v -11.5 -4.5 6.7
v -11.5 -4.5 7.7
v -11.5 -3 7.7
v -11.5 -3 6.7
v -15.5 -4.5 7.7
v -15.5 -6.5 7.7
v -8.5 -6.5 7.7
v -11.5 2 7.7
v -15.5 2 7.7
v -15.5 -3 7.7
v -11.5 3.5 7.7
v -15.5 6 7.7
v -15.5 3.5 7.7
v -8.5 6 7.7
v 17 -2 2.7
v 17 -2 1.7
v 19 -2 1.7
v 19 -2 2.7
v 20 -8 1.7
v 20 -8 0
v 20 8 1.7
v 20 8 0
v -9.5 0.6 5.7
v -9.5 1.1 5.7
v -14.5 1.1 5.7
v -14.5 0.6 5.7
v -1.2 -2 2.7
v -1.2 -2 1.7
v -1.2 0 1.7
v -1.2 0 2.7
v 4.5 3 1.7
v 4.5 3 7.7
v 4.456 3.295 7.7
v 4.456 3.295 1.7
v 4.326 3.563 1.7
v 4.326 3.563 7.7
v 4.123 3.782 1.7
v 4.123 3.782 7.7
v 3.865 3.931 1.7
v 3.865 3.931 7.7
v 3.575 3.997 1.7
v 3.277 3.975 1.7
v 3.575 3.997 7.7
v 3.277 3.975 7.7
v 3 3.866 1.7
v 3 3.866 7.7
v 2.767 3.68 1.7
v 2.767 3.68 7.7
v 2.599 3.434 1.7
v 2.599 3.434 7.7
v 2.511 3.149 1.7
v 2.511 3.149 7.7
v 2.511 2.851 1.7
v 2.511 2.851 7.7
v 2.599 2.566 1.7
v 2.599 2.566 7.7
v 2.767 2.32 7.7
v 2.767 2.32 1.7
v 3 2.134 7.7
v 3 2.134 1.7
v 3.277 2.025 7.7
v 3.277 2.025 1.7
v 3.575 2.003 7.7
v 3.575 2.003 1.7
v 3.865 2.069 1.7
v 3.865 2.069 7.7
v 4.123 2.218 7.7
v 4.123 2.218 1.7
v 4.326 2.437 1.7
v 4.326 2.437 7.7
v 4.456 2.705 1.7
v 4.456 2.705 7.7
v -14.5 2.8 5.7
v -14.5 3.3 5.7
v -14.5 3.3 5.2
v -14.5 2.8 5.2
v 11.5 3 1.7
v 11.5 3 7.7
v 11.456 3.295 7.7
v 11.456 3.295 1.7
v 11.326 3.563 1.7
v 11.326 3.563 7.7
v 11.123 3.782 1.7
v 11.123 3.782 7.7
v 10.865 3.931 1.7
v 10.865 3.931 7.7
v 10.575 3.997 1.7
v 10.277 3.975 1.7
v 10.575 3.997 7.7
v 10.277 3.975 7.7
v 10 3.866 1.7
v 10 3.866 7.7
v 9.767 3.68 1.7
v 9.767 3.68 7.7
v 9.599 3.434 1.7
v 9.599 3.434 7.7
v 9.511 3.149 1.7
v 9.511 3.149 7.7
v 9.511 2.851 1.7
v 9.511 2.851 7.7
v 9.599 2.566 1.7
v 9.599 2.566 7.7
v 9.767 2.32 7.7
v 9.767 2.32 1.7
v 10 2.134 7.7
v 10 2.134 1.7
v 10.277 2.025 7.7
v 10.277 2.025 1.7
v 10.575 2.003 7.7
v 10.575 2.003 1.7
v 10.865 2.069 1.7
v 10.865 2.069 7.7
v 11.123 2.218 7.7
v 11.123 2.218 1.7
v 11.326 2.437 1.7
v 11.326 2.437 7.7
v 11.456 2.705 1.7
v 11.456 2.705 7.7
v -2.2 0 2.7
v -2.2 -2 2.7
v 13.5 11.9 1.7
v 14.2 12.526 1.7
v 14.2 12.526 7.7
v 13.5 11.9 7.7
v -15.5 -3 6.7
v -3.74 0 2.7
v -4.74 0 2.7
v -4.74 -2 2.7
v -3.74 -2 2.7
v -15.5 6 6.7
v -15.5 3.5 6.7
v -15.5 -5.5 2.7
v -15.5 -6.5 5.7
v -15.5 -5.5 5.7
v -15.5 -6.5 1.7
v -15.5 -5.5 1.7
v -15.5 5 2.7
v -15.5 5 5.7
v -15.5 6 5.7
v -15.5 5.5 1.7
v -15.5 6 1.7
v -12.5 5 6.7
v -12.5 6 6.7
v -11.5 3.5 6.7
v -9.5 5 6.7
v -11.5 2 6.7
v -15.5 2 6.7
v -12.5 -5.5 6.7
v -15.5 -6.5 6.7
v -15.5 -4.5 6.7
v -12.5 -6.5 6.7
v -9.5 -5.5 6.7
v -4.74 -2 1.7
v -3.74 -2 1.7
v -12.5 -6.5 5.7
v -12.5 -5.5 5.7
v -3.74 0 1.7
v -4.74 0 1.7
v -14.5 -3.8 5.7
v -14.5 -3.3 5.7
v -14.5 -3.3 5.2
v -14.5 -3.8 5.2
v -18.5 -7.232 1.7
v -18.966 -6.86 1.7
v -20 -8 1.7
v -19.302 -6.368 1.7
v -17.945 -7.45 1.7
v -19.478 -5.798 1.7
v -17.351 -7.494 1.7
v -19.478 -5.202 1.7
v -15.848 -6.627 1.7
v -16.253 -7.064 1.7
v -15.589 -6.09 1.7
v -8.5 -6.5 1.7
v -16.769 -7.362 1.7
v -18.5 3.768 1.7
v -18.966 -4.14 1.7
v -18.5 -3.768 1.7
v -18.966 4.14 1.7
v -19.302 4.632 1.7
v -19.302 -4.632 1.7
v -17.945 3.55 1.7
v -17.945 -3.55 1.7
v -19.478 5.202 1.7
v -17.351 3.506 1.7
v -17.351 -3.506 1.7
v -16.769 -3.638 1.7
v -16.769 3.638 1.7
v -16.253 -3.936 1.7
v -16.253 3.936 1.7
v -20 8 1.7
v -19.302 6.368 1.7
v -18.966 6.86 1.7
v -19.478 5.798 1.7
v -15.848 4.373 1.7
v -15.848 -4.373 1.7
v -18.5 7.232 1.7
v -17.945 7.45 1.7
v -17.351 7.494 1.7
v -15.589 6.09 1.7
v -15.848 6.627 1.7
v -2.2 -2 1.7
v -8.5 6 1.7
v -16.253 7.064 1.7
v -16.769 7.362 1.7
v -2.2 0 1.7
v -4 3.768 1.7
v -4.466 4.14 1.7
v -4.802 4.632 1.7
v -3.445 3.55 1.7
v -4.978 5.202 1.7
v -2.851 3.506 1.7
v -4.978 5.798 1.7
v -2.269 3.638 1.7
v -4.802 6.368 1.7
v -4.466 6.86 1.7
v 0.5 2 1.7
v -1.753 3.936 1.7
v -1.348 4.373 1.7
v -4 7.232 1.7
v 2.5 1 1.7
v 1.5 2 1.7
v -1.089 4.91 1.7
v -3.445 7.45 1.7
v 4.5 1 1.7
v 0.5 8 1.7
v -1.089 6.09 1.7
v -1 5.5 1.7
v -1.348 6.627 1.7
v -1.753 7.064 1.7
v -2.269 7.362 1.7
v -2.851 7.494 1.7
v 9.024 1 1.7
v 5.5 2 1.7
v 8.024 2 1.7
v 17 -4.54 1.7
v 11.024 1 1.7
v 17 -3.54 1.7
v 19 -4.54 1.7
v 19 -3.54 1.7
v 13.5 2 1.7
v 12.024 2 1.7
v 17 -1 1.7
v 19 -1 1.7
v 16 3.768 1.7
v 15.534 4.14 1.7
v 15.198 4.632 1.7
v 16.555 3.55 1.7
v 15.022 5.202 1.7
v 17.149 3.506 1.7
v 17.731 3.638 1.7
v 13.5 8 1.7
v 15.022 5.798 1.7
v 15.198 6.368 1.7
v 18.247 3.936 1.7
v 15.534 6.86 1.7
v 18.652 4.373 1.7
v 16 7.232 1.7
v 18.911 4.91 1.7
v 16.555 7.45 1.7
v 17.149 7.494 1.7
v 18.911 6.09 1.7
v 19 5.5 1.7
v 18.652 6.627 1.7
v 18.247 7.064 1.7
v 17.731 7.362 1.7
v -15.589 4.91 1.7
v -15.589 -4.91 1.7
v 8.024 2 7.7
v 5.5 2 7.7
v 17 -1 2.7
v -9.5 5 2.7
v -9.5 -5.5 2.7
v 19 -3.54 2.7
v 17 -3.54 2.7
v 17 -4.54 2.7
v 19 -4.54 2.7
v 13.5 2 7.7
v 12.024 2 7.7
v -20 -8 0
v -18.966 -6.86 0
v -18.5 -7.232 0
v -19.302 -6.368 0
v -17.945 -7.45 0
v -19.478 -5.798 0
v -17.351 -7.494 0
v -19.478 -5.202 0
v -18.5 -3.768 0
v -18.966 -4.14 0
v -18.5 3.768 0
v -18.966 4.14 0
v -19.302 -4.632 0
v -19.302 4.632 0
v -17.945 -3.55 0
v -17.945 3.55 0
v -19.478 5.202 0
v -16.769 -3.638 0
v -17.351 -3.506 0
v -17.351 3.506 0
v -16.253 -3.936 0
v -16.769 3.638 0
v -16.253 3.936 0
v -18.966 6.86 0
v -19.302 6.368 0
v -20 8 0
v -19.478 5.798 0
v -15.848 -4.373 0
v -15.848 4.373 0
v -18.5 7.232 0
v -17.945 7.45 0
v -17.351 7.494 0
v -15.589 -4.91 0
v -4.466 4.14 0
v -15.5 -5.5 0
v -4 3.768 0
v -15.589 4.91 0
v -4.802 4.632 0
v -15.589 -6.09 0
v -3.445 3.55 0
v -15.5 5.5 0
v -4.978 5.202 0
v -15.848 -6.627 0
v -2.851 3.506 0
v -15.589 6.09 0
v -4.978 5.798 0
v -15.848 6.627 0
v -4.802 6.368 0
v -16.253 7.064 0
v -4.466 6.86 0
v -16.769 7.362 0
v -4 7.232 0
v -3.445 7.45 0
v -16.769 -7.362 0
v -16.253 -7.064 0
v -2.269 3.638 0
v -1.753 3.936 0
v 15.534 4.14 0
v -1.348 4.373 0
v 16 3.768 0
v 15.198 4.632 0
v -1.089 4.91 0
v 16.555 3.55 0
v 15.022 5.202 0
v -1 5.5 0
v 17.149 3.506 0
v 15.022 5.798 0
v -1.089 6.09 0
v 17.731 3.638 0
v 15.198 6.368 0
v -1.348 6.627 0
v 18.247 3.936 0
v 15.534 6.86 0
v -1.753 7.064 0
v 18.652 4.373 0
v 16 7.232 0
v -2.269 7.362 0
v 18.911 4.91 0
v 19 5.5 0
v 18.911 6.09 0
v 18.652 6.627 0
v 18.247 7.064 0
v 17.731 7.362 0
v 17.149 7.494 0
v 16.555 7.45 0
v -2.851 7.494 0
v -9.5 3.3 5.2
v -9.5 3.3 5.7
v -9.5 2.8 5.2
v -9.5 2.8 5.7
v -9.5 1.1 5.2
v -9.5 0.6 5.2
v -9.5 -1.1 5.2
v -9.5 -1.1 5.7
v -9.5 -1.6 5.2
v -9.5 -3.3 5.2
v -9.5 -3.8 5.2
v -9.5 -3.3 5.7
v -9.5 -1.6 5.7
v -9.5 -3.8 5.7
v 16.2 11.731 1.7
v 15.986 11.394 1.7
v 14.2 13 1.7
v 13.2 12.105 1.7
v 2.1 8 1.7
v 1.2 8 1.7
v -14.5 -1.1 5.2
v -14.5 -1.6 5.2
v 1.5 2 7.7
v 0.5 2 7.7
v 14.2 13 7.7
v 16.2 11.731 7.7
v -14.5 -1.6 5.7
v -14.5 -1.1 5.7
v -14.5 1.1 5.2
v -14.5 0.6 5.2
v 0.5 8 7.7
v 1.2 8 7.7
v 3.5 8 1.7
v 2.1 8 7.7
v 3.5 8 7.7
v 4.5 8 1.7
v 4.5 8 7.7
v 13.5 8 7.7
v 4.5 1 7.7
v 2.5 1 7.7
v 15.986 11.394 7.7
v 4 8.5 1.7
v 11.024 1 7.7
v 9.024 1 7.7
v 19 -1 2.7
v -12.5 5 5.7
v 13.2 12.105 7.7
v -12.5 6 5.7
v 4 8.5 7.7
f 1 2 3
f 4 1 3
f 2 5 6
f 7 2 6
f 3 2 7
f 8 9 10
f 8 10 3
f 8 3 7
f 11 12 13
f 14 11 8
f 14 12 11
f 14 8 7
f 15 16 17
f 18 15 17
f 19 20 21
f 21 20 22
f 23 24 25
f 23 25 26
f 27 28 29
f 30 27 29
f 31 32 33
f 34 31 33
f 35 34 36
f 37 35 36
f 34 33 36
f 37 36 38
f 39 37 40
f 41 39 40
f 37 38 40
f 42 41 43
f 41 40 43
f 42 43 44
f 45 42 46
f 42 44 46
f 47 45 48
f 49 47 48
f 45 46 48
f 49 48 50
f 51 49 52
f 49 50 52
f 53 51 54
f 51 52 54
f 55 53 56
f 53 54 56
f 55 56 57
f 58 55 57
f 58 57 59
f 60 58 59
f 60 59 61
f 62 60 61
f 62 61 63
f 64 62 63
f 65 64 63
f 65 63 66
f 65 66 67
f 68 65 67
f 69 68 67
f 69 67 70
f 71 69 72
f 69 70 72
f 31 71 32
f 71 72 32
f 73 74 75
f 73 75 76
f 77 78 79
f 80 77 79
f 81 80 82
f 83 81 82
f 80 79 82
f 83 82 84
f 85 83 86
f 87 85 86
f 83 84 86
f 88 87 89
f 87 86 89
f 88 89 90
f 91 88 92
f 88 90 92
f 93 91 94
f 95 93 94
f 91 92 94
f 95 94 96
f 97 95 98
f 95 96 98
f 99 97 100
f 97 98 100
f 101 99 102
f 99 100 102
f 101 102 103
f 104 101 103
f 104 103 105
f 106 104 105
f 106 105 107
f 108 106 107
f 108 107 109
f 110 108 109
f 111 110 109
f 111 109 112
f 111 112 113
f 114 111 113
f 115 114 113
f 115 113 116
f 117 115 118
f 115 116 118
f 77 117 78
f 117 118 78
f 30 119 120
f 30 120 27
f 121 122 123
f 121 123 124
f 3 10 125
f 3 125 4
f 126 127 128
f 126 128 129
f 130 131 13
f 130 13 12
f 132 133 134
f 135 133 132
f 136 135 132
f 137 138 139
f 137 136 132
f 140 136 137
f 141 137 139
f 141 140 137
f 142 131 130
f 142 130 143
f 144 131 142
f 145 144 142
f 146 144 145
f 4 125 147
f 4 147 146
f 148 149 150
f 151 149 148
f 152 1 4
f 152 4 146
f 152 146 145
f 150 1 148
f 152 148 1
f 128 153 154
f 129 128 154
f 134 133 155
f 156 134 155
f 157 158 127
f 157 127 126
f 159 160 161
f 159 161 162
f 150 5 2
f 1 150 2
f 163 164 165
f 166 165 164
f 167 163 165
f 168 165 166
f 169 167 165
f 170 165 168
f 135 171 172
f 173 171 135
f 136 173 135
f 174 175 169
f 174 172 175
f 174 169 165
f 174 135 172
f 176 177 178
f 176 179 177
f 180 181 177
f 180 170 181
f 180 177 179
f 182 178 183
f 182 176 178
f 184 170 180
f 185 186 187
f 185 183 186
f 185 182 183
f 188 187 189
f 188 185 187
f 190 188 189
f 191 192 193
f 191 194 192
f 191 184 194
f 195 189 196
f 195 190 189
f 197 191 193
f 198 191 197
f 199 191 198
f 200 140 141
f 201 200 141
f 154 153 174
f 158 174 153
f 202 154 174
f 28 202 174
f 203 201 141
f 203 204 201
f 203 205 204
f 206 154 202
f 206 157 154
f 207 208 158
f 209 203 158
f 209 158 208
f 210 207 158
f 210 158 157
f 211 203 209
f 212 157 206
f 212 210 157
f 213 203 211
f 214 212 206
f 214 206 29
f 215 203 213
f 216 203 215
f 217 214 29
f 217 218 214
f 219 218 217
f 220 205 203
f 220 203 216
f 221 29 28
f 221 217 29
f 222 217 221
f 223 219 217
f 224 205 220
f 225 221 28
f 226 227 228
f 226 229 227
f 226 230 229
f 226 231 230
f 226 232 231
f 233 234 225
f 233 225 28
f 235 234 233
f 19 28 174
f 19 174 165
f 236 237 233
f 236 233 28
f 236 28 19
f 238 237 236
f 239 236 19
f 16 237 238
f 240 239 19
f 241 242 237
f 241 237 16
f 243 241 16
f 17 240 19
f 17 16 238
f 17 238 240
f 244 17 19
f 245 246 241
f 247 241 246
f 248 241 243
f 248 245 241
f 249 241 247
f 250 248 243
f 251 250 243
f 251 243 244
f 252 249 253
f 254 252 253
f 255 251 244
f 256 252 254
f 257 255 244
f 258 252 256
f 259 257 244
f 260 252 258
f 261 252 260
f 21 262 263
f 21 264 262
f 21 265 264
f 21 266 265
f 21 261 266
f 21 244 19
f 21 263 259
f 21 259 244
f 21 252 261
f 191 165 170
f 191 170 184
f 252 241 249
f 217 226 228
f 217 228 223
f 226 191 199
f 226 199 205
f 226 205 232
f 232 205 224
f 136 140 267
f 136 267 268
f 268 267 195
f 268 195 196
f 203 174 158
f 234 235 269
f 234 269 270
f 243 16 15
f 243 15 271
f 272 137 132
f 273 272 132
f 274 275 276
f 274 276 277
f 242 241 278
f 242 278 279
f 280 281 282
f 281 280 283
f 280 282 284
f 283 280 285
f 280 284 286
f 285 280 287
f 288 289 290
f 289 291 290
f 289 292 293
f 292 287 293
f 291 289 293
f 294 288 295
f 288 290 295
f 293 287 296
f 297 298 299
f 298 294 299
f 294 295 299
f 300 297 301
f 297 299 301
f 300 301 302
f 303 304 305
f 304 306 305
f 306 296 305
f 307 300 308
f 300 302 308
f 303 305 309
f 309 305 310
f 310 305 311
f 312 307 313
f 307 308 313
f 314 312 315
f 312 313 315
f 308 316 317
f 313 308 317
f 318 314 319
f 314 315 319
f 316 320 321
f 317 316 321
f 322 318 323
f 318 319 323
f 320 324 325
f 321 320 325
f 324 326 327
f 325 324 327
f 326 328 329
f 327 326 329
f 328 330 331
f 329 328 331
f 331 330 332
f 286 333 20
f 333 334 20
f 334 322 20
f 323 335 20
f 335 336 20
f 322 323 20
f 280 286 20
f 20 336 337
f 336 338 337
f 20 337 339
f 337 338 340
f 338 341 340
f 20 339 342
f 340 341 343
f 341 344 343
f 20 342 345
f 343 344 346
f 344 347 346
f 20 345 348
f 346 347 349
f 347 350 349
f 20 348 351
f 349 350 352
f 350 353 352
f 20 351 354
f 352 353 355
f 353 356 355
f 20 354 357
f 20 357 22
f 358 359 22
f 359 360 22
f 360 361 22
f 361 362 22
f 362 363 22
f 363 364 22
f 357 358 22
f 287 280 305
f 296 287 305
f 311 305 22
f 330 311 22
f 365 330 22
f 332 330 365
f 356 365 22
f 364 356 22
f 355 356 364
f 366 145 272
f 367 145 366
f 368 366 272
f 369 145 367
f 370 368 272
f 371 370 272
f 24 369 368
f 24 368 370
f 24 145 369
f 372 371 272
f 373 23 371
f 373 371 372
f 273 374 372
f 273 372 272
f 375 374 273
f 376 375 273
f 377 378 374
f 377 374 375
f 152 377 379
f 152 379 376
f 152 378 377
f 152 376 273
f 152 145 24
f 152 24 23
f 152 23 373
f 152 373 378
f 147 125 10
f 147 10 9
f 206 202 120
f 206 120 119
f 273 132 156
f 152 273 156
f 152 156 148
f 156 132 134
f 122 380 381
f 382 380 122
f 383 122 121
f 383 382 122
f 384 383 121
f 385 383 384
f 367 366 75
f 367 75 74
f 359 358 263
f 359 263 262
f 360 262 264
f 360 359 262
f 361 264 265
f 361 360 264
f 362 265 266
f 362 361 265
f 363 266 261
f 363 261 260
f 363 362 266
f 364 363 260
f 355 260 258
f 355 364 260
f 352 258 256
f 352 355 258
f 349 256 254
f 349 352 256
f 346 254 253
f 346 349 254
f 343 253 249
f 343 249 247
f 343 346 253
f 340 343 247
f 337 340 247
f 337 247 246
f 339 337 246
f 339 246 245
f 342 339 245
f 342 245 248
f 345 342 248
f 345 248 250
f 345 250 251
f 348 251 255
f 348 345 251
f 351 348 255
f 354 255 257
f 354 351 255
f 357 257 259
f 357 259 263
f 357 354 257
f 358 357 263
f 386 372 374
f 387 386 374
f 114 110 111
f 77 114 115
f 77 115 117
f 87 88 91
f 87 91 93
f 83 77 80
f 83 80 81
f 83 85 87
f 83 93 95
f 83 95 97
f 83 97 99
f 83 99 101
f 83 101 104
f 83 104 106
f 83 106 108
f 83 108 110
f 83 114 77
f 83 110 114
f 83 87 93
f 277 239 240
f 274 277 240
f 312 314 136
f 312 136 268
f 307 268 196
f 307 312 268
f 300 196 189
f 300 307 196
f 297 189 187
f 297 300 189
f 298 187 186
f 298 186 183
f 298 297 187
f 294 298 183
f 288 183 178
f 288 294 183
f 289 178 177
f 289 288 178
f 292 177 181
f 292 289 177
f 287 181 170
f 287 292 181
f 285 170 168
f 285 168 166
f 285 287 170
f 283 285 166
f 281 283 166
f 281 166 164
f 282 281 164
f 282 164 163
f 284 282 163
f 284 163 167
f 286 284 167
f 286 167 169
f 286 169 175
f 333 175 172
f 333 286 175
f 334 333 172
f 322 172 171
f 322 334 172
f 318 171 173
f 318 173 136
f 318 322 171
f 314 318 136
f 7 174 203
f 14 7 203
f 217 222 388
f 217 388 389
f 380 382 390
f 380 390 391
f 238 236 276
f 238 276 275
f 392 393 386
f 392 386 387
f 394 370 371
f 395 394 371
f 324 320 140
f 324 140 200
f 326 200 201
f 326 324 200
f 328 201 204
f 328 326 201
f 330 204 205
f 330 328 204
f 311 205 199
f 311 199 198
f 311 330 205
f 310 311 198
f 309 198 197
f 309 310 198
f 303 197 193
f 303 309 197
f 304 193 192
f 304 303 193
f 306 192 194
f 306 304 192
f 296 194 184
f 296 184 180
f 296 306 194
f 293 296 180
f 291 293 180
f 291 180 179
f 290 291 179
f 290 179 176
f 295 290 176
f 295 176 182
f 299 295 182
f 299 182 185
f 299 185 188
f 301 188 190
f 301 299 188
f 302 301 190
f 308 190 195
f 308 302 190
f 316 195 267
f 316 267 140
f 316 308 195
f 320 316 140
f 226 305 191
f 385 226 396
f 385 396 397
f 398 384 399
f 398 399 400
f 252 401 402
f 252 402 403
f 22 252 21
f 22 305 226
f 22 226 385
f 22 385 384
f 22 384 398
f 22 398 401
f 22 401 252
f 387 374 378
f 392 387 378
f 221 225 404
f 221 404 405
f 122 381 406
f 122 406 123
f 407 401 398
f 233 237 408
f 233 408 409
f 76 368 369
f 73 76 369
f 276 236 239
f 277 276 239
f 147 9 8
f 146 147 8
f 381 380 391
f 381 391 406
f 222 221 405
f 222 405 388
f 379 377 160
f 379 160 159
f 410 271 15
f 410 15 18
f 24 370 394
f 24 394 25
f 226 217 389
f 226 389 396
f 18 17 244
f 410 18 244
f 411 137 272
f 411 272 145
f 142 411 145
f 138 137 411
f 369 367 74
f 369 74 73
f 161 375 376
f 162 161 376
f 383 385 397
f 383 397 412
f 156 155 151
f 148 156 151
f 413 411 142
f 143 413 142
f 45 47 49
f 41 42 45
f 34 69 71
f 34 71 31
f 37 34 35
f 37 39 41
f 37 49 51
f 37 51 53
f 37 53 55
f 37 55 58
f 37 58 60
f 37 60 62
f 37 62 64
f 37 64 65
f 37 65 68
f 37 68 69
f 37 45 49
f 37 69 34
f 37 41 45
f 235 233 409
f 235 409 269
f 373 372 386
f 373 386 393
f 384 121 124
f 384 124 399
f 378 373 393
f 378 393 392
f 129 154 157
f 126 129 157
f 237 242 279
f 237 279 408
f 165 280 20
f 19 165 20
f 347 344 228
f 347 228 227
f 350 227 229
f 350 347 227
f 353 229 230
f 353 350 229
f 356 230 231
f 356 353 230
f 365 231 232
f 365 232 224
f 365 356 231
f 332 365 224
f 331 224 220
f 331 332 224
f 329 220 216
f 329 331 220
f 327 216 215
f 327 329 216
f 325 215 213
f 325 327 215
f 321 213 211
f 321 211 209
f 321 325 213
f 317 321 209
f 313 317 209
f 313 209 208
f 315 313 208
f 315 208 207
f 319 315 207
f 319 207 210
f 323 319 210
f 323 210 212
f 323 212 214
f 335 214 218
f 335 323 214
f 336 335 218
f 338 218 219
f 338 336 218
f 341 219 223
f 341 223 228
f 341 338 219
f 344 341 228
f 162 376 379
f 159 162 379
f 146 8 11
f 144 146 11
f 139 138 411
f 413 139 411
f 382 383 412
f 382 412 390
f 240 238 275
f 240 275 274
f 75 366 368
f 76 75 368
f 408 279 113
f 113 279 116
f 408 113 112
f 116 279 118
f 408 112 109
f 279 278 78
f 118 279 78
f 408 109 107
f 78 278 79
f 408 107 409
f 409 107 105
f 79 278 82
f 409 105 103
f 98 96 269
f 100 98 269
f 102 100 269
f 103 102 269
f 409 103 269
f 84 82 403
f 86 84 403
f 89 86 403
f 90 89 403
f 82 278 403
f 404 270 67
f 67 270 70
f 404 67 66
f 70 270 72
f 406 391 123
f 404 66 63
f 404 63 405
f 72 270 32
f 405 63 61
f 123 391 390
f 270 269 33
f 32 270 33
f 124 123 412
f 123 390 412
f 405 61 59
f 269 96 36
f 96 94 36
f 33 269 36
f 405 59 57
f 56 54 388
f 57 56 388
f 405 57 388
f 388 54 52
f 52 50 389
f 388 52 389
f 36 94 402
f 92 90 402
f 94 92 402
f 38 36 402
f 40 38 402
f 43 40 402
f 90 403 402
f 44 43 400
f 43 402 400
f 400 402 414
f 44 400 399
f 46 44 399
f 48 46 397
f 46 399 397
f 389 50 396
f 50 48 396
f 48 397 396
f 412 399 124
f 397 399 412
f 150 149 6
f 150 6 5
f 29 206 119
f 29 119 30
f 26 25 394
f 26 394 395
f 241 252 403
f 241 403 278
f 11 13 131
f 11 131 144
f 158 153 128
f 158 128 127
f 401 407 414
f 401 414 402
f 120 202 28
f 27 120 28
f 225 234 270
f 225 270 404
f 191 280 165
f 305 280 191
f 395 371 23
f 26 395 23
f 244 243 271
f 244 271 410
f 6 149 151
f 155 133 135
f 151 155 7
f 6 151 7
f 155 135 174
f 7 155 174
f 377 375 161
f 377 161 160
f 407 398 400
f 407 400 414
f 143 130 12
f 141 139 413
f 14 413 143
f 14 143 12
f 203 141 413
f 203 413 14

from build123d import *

# Parameters (mm, degrees)
SKETCH_W        = 40
SKETCH_H        = 16
SKETCH_R        = 2
PAD_DEPTH       = 1.7
SKETCH001_W     = 7
SKETCH001_H     = 12.5
PAD001_DEPTH    = 6
SKETCH002_W     = 1
SKETCH002_H     = 2
SKETCH002_W_2   = 2
SKETCH002_H_2   = 1
PAD002_DEPTH    = 1
SKETCH004_R     = 1
POCKET_DEPTH    = 6
SKETCH005_W     = 4
SKETCH005_H     = 1.5
POCKET001_DEPTH = 5
SKETCH006_W     = 10.5
SKETCH006_H     = 4
POCKET002_DEPTH = 6
SKETCH007_W     = 3
SKETCH007_H     = 1
POCKET003_DEPTH = 19.501
SKETCH008_W     = 0.5
SKETCH008_H     = 0.5
PAD003_DEPTH    = 5


with BuildPart() as part:
    # Sketch → Pad (new body)
    with BuildSketch(Plane.XY):
        Rectangle(SKETCH_W, SKETCH_H)
        with Locations((-17.5, 5.5)):
            Circle(SKETCH_R, mode=Mode.SUBTRACT)
        with Locations((-17.5, -5.5)):
            Circle(SKETCH_R, mode=Mode.SUBTRACT)
        with Locations((-3, 5.5)):
            Circle(SKETCH_R, mode=Mode.SUBTRACT)
        with Locations((17, 5.5)):
            Circle(SKETCH_R, mode=Mode.SUBTRACT)
    extrude(amount=PAD_DEPTH)

    # Sketch001 (on Face10 of Pad) → Pad001 (new body)
    with BuildSketch(Plane.XY.offset(1.7)):
        Polygon((13.5, 8), (13.5, 2), (12.024086, 2), (11.024086, 1), (9.024086, 1), (8.024086, 2), (5.5, 2), (4.5, 1), (2.5, 1), (1.5, 2), (0.5, 2), (0.5, 8), (1.2, 8), (13.2, 12.105263), (14.2, 13), (16.2, 11.731371), (15.985743, 11.393594), (14.2, 12.526316), (13.5, 11.9), (2.1, 8), (3.5, 8), (4, 8.5), (4.5, 8), align=None)
        with Locations((-12, -0.25)):
            Rectangle(SKETCH001_W, SKETCH001_H)
    extrude(amount=PAD001_DEPTH)

    # Sketch002 (on Face5 of Pad001) → Pad002 (new body)
    with BuildSketch(Plane.XY.offset(1.7)):
        with Locations((-4.24, -1)):
            Rectangle(SKETCH002_W, SKETCH002_H)
        with Locations((-1.7, -1)):
            Rectangle(SKETCH002_W, SKETCH002_H)
        with Locations((18, -1.5)):
            Rectangle(SKETCH002_W_2, SKETCH002_H_2)
        with Locations((18, -4.04)):
            Rectangle(SKETCH002_W_2, SKETCH002_H_2)
    extrude(amount=PAD002_DEPTH)

    # Sketch004 (on Face47 of Pad002) → Pocket (cut)
    with BuildSketch(Plane.XY.offset(7.7)):
        with Locations((3.5, 3)):
            Circle(SKETCH004_R)
        with Locations((10.5, 3)):
            Circle(SKETCH004_R)
    extrude(amount=-POCKET_DEPTH, mode=Mode.SUBTRACT)

    # Sketch005 (on Face61 of Pocket) → Pocket001 (cut)
    with BuildSketch(Plane.XY.offset(7.7)):
        with Locations((-13.5, 2.75)):
            Rectangle(SKETCH005_W, SKETCH005_H)
        with Locations((-13.5, -3.75)):
            Rectangle(SKETCH005_W, SKETCH005_H)
    extrude(amount=-POCKET001_DEPTH, mode=Mode.SUBTRACT)

    # Sketch006 (on Face43 of Pocket001) → Pocket002 (cut)
    with BuildSketch(Plane(origin=(-15.5, 0, 0), x_dir=(0, -1, 0), z_dir=(-1, 0, 0))):
        with Locations((0.25, 4.7)):
            Rectangle(SKETCH006_W, SKETCH006_H)
    extrude(amount=-POCKET002_DEPTH, mode=Mode.SUBTRACT)

    # Sketch007 (on Face44 of Pocket002) → Pocket003 (cut, through all)
    with BuildSketch(Plane.XZ.offset(6.5)):
        with Locations((-14, 6.2)):
            Rectangle(SKETCH007_W, SKETCH007_H)
    extrude(amount=-POCKET003_DEPTH, mode=Mode.SUBTRACT)

    # Sketch008 (on Face77 of Pocket003) → Pad003 (new body)
    with BuildSketch(Plane(origin=(-9.5, 0, 0), x_dir=(0, -1, 0), z_dir=(-1, 0, 0))):
        with Locations((-3.05, 5.45)):
            Rectangle(SKETCH008_W, SKETCH008_H)
        with Locations((-0.85, 5.45)):
            Rectangle(SKETCH008_W, SKETCH008_H)
        with Locations((1.35, 5.45)):
            Rectangle(SKETCH008_W, SKETCH008_H)
        with Locations((3.55, 5.45)):
            Rectangle(SKETCH008_W, SKETCH008_H)
    extrude(amount=PAD003_DEPTH)


solid = part.part
